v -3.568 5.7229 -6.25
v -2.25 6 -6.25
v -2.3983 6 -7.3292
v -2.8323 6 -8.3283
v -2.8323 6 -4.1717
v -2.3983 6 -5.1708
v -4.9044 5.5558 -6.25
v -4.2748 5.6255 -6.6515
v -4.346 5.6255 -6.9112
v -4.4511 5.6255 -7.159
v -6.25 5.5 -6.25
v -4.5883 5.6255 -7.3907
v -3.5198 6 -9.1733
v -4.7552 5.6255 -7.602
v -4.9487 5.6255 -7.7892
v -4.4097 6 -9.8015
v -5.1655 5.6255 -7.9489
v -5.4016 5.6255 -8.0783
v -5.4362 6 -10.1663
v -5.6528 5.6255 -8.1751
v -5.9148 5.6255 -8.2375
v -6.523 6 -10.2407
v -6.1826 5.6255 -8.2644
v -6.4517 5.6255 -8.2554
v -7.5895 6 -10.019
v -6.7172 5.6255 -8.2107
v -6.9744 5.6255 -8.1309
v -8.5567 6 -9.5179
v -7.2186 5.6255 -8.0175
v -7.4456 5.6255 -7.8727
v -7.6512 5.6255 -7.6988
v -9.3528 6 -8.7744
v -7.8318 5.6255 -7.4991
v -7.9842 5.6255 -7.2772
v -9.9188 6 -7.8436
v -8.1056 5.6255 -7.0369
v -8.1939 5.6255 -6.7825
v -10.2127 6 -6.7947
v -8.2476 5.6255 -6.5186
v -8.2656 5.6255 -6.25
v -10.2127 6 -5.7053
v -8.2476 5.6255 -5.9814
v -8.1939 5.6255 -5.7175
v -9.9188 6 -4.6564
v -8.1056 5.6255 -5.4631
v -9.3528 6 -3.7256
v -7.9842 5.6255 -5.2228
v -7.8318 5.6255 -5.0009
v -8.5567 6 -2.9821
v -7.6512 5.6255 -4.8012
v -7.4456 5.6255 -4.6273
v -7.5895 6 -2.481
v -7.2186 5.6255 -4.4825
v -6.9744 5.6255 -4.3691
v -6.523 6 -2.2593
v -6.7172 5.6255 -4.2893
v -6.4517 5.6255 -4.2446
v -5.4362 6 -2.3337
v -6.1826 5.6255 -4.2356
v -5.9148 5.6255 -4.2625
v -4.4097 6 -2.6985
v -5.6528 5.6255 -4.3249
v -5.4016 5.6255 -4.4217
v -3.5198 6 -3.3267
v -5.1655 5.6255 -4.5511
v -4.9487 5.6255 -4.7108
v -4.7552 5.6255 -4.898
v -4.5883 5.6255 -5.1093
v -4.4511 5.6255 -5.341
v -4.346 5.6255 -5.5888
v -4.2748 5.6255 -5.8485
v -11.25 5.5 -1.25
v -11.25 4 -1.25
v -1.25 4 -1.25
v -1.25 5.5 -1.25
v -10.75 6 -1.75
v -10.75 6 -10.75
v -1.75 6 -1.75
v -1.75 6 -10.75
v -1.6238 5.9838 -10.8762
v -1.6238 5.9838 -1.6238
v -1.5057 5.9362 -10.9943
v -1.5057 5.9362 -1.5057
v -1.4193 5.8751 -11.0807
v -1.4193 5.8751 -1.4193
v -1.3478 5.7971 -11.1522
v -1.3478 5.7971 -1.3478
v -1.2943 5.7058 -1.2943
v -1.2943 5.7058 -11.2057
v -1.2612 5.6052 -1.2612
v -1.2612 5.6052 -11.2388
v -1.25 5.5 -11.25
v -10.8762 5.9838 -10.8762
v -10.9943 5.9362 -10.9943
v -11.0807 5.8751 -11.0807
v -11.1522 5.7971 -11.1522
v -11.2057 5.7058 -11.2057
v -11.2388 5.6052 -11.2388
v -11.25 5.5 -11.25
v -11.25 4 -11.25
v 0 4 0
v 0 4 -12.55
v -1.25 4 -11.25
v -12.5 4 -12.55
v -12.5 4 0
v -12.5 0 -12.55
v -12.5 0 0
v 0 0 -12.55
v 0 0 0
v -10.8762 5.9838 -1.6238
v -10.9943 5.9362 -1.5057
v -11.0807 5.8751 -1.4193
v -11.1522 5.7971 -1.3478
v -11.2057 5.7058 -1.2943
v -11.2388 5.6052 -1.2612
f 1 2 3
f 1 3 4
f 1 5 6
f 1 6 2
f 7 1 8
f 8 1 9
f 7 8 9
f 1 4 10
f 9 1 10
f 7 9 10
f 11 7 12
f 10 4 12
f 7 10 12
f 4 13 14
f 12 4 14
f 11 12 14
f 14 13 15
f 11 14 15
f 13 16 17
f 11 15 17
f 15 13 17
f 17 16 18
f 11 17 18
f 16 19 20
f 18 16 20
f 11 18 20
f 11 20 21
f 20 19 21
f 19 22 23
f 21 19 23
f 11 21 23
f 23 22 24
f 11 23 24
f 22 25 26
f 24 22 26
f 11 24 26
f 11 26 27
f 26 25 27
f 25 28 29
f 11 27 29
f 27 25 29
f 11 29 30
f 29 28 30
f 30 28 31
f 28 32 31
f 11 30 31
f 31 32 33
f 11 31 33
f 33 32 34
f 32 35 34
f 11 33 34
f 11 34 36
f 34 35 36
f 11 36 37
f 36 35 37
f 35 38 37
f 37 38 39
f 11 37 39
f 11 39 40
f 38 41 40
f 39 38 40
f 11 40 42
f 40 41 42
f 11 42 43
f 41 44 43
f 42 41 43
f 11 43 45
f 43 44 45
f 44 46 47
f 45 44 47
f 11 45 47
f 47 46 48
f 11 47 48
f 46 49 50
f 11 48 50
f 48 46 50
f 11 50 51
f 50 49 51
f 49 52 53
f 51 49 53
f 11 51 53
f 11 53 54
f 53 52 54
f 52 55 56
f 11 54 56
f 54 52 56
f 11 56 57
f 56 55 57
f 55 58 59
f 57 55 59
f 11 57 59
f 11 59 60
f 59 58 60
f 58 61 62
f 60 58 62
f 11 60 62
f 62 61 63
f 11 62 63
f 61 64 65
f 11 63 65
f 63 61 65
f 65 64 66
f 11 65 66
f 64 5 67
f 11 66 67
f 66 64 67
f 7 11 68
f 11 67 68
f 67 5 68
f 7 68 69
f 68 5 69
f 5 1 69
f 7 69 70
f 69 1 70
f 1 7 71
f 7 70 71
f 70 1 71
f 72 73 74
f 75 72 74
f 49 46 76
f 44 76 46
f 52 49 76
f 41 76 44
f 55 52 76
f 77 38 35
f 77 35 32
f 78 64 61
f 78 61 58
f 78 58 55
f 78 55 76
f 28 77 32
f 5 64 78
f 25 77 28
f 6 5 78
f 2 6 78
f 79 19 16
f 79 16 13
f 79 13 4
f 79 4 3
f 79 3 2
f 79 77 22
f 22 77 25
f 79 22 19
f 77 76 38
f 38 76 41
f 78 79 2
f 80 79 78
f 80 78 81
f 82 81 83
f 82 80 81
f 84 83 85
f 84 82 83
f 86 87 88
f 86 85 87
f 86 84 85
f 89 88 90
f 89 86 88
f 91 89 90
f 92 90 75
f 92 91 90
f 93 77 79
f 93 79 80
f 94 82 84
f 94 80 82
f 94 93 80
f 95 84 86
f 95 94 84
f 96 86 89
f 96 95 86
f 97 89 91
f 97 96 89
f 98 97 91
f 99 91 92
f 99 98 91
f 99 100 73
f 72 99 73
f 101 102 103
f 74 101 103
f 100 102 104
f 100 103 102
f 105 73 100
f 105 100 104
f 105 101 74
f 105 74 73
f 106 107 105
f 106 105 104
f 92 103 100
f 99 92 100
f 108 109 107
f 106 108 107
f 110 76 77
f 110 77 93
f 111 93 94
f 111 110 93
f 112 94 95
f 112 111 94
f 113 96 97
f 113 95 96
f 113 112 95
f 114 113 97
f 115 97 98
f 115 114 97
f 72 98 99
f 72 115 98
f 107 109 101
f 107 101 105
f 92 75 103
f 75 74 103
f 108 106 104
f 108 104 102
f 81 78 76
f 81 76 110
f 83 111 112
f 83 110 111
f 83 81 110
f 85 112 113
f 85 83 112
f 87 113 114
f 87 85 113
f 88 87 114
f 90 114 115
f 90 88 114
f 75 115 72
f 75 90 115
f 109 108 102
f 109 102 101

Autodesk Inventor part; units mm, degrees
ref_plane "YZ Plane" through (0, 0, 0) normal (1, 0, 0) x (0, 1, 0)
ref_plane "XZ Plane" through (0, 0, 0) normal (0, 1, 0) x (-1, 0, 0)
ref_plane "XY Plane" through (0, 0, 0) normal (0, 0, 1) x (1, 0, 0)
sketch "Sketch1" plane through (0, 0, 0) normal (0, 1, 0) x (-1, 0, 0)
  line L0 (0, 0) -> (12.5, 0)
  line L1 (12.5, 0) -> (12.5, -12.55)
  line L2 (12.5, -12.55) -> (0, -12.55)
  line L3 (0, -12.55) -> (0, 0)
  dimension "d0" = 12.5
  dimension "d1" = 12.55
extrude "Extrusion1" add sketch "Sketch1" along normal blind 4
sketch "Sketch2" plane through (0, 4, 0) normal (0, 1, 0) x (1, 0, 0)
  line L0 (-11.25, 1.25) -> (-1.25, 1.25)
  line L1 (-1.25, 1.25) -> (-1.25, 11.25)
  line L2 (-1.25, 11.25) -> (-11.25, 11.25)
  line L3 (-11.25, 11.25) -> (-11.25, 1.25)
  line L4 (-12.5, 0) -> (0, 0) projected
  line L5 (-12.5, 12.55) -> (-12.5, 0) projected
  dimension "d4" = 10
  dimension "d5" = 10
  dimension "d6" = 1.25
  dimension "d7" = 1.25
extrude "Extrusion2" add sketch "Sketch2" along normal blind 2
ref_plane "Work Plane1" through (-11.25, 4, -6.25) normal (0, 0, 1) x (1, 0, 0)
sketch "Sketch3" plane through (-11.25, 4, -6.25) normal (0, 0, 1) x (1, 0, 0)
  line L0 (10, 0) -> (0, 0) projected
  line L1 (10, 0) -> (10, 2) projected
  line L2 (0, 2) -> (10, 2) projected
  line L3 (0, 0) -> (0, 2) projected
  line L4 (5, 2) -> (5, 1.5)
  line L5 (5, 2) -> (9, 2)
  line L6 (5, 2) -> (1, 2)
  arc A0 (1, 2) -> (9, 2) centre (5, 17.75) ccw
  point P0 (11.25, -4)
  dimension "d10" = 0.5
  dimension "d11" = 4
  dimension "d12" = 4
revolve "Revolution1" cut sketch "Sketch3" angle 360 about axis through (-6.25, 6, -6.25) along (0, -1, 0) picked at (7.2273, 1.9076) contours A0 L4 L2
fillet "Fillet1" radius 0.5 4 edges at (-11.25, 6, -6.25) (-6.25, 6, -11.25) (-1.25, 6, -6.25) (-6.25, 6, -1.25)
properties part number "Top Button" material "PC/ABS Plastic"
